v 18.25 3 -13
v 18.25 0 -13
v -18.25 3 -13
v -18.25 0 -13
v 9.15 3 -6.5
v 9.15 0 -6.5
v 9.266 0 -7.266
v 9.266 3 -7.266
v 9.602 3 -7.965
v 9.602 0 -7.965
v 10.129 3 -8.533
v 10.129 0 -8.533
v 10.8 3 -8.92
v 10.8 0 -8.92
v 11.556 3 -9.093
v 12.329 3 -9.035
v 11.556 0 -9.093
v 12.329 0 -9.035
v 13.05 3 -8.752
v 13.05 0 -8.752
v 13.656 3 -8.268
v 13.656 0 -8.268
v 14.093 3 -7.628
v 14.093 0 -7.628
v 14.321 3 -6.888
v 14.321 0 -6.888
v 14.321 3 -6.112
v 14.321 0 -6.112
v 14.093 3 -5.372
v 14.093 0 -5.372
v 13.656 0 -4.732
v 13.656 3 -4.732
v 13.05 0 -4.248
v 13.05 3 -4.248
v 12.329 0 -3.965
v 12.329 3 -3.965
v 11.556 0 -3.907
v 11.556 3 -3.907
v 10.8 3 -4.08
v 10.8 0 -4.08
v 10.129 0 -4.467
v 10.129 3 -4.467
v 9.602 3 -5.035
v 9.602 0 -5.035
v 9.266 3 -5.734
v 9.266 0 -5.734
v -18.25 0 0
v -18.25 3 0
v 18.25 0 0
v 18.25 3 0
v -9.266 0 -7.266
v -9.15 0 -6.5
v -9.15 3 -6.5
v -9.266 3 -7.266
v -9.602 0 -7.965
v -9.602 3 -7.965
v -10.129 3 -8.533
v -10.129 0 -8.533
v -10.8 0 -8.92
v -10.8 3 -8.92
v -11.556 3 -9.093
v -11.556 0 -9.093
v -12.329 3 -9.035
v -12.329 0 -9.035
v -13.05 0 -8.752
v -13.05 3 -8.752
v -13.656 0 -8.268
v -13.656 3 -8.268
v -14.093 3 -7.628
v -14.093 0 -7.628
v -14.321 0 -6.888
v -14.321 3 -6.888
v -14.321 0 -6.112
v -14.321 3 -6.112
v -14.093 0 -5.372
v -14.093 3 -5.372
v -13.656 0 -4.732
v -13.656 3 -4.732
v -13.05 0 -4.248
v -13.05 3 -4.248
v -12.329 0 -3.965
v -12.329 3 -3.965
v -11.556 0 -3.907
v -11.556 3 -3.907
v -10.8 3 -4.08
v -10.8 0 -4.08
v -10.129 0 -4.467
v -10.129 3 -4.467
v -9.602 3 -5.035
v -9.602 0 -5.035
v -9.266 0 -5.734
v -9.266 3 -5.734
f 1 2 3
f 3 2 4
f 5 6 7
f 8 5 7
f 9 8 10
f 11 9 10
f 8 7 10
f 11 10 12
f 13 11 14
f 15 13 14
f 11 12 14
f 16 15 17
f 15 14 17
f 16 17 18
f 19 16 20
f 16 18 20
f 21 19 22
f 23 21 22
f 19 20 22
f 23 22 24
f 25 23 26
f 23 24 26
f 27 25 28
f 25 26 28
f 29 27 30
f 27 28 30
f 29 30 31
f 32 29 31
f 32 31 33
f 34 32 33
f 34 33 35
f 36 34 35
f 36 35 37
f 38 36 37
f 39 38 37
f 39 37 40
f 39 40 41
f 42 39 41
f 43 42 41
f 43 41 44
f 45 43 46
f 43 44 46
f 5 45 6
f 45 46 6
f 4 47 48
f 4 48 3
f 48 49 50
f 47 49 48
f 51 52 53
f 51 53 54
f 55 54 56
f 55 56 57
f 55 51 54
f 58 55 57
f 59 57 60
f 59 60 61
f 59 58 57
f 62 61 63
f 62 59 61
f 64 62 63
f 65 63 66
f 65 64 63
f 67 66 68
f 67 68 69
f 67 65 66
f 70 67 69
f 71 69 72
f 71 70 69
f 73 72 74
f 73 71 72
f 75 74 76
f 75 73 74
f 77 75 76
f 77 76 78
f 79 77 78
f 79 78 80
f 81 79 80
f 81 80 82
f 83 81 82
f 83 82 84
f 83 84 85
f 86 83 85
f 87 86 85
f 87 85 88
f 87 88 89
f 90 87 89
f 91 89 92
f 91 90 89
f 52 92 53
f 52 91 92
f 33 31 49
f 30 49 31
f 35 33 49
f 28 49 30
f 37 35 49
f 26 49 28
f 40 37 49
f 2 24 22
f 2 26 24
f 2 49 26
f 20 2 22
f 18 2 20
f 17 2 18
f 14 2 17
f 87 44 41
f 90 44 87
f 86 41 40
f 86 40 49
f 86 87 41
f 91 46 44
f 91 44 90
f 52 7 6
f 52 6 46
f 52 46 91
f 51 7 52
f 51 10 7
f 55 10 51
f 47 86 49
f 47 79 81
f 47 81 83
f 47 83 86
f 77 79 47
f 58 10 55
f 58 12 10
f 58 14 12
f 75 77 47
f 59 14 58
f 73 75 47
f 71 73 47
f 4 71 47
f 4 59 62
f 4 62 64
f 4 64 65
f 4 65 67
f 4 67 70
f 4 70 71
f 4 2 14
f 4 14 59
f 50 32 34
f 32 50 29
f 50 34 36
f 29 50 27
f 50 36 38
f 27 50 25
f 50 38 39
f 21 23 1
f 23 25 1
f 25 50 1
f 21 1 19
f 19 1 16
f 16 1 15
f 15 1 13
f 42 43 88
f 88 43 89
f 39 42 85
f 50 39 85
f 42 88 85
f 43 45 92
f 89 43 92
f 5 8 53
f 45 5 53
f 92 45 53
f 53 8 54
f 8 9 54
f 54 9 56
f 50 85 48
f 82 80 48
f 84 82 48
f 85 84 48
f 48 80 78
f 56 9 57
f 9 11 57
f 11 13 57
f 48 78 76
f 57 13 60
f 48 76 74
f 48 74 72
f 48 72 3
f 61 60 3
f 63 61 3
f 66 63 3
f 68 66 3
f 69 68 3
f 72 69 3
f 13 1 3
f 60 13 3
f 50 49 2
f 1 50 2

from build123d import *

# Parameters (mm, degrees)
ESQUISSE1_W        = 18.25
ESQUISSE1_H        = 13
ESQUISSE1_R        = 2.6
BOSS_EXTRU_1_DEPTH = 3


with BuildPart() as part:
    # Esquisse1 → Boss.-Extru.1 (new body)
    with BuildSketch(Plane(origin=(0, 0, 0), x_dir=(1, 0, 0), z_dir=(0, 1, 0))):
        with Locations((-9.125, 6.5)):
            Rectangle(ESQUISSE1_W, ESQUISSE1_H)
        with Locations((-11.75, 6.5)):
            Circle(ESQUISSE1_R, mode=Mode.SUBTRACT)
    boss_extru_1 = extrude(amount=BOSS_EXTRU_1_DEPTH)

    # Symétrie1: Boss.-Extru.1 across plane
    add(boss_extru_1.mirror(Plane(origin=(0, 0, 0), x_dir=(0, 0, 1), z_dir=(1, 0, 0))))


solid = part.part
